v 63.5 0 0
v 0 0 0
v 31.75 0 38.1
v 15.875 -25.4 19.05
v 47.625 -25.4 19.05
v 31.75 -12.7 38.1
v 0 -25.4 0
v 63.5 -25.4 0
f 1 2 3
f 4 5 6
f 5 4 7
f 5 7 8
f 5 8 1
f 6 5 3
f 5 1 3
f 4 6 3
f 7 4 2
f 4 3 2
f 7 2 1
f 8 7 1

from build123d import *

# Parameters (mm, degrees)
F1_DEPTH = 25.4
F2_DEPTH = 25.4
F6_DEPTH = 15.875


with BuildPart() as f1:
    # F0 (on Front) → F1 (new body)
    with BuildSketch(Plane.XZ):
        Polygon((15.875, 19.05), (0, 0), (63.5, 0), (47.625, 19.05), align=None)
    extrude(amount=F1_DEPTH)

    # F0 (on Front) → F2 (join)
    with BuildSketch(Plane.XZ):
        Polygon((15.875, 19.05), (0, 0), (63.5, 0), (47.625, 19.05), align=None)
        Polygon((31.75, 38.1), (15.875, 19.05), (47.625, 19.05), align=None)
    extrude(amount=F2_DEPTH)

    # F5 (on 3pt) → F6 (cut, symmetric)
    with BuildSketch(Plane.YZ.offset(31.75)):
        Polygon((-25.4, 19.05), (-12.7, 38.1), (-25.4, 38.1), align=None)
    extrude(amount=F6_DEPTH, both=True, mode=Mode.SUBTRACT)


solid = f1.part
